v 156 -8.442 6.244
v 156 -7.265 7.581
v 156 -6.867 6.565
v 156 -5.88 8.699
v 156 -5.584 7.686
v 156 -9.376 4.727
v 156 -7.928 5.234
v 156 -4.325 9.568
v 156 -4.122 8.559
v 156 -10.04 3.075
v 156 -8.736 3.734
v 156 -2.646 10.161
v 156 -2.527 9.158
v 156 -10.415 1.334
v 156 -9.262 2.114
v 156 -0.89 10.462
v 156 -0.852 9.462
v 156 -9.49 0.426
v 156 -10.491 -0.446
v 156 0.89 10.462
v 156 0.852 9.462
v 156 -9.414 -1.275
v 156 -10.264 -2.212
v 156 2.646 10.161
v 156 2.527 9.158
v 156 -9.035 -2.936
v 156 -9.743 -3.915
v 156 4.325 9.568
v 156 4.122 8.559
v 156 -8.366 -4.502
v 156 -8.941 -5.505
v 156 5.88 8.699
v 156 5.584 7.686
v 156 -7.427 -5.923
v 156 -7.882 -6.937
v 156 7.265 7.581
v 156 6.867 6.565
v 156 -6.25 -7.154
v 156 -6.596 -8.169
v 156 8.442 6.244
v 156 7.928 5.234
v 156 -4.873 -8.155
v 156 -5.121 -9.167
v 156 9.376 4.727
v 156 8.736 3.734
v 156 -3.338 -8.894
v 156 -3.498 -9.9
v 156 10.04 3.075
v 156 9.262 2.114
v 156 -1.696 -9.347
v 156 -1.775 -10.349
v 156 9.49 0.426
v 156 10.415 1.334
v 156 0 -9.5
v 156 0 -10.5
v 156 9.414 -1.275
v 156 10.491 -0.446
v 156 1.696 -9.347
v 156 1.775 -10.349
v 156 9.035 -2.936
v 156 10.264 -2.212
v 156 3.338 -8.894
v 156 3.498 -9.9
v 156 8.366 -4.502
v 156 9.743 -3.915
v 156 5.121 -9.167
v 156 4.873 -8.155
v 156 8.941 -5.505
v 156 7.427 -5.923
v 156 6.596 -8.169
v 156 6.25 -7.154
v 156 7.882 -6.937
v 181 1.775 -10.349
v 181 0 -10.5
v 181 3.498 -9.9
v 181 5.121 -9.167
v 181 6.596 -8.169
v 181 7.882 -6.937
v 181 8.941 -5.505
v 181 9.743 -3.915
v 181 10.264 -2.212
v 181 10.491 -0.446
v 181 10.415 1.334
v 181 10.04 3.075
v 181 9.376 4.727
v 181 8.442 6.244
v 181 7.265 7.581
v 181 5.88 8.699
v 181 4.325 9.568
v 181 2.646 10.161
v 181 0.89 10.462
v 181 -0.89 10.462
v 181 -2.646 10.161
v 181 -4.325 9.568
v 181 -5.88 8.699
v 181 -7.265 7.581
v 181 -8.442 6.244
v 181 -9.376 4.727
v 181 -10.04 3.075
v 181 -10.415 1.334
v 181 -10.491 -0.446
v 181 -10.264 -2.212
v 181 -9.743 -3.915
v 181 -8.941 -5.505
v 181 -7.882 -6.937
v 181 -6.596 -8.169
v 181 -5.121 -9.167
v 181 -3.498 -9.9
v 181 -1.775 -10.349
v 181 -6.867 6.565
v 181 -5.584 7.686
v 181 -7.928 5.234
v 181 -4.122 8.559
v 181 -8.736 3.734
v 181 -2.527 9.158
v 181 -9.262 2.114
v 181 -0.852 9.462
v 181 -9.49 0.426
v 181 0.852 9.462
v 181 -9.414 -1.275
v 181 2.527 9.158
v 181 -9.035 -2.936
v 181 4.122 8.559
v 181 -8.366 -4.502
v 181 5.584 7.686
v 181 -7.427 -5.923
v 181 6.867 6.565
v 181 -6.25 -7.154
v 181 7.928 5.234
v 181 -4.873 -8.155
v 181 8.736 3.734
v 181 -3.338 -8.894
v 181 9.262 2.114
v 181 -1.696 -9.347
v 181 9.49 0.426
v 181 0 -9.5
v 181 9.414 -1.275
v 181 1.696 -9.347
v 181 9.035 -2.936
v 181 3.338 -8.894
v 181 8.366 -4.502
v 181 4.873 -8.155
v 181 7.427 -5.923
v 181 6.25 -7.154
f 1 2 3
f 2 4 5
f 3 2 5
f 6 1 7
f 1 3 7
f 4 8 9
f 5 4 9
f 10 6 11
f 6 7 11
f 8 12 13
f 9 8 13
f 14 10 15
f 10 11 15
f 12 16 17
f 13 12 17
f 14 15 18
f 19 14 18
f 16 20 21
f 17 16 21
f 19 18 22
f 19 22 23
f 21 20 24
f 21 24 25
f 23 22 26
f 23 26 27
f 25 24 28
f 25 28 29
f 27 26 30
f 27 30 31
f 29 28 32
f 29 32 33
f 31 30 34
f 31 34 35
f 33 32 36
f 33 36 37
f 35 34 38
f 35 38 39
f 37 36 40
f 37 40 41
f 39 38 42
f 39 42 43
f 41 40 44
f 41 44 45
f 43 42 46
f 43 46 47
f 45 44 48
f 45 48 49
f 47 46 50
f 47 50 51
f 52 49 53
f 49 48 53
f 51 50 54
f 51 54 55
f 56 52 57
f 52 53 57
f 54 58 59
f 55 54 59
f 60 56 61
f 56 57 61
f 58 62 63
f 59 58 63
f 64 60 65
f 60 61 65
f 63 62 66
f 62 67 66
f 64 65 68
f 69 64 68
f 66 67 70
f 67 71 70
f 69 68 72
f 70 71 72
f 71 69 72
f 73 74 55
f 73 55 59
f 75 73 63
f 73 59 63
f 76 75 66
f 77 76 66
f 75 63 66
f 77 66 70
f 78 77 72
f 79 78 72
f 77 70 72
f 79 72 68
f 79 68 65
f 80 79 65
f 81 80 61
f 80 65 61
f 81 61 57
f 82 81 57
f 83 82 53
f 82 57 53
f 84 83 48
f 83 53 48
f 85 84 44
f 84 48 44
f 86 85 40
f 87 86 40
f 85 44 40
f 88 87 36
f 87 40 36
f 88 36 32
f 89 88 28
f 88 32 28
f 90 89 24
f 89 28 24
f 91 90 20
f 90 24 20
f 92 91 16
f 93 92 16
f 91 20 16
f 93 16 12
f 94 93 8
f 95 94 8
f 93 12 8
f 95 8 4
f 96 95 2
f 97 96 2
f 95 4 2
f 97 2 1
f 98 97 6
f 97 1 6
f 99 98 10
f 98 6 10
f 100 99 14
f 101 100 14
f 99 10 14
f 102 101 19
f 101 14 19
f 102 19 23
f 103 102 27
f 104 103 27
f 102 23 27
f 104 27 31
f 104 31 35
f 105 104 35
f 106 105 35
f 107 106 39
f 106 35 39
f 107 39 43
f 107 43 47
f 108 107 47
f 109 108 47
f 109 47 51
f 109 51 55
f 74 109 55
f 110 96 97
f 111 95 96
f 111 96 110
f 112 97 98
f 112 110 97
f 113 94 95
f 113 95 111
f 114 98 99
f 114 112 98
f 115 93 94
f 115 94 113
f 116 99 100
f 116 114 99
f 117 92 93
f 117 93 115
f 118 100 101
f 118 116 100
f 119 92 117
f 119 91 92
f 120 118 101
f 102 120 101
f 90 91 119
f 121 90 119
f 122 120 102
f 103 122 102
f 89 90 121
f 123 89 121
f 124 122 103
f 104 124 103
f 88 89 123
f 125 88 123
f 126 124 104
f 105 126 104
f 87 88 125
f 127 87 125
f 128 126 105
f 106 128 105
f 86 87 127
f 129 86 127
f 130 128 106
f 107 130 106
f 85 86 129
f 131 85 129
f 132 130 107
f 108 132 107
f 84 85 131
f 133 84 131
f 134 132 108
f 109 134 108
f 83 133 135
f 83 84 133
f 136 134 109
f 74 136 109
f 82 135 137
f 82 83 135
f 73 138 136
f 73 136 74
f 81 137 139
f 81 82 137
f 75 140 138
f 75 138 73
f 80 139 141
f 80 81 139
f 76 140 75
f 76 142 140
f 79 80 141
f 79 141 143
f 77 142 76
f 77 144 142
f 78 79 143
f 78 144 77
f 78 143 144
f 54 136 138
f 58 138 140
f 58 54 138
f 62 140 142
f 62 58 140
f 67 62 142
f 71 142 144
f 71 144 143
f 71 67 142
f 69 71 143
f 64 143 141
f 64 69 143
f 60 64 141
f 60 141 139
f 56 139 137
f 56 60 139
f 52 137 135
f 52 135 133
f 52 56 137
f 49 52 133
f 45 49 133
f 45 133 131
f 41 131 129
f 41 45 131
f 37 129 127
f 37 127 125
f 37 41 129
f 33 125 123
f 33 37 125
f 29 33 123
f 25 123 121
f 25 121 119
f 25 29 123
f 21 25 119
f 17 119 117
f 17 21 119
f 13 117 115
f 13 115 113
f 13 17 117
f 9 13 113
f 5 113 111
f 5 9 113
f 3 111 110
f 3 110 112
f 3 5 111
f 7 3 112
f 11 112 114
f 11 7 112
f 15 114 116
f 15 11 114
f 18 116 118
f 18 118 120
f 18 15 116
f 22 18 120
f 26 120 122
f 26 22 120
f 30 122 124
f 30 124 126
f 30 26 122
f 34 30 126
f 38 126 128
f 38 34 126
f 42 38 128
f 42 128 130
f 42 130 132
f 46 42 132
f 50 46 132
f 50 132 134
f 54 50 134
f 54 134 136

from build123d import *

# Parameters (mm, degrees)
CYLINDER009_R           = 9.5
CYLINDER009_DEPTH       = 25
CYLINDER009_PITCH_ANGLE = 90
CYLINDER007_R           = 10.5
CYLINDER007_DEPTH       = 25
CYLINDER007_PITCH_ANGLE = 90


with BuildPart() as cylinder007:
    # Cylinder009 → Cylinder009 (new body)
    with BuildSketch(Plane.XY):
        Circle(CYLINDER009_R)
    extrude(amount=CYLINDER009_DEPTH)


with BuildPart() as cylinder007_1:
    # Cylinder009 pitch: moved
    add(cylinder007.part.rotate(Axis((0, 0, 0), (0, 1, 0)), CYLINDER009_PITCH_ANGLE))


with BuildPart() as cylinder007_2:
    # Cylinder009 placement: moved
    add(cylinder007_1.part.moved(Location((156, 0, 0))))


with BuildPart() as cut004:
    # Cylinder007 → Cylinder007 (new body)
    with BuildSketch(Plane.XY):
        Circle(CYLINDER007_R)
    extrude(amount=CYLINDER007_DEPTH)


with BuildPart() as cut004_1:
    # Cylinder007 pitch: moved
    add(cut004.part.rotate(Axis((0, 0, 0), (0, 1, 0)), CYLINDER007_PITCH_ANGLE))


with BuildPart() as cut004_2:
    # Cylinder007 placement: moved
    add(cut004_1.part.moved(Location((156, 0, 0))))

    # Cut004: cut Cylinder007
    add(cylinder007_2.part, mode=Mode.SUBTRACT)


solid = cut004_2.part
